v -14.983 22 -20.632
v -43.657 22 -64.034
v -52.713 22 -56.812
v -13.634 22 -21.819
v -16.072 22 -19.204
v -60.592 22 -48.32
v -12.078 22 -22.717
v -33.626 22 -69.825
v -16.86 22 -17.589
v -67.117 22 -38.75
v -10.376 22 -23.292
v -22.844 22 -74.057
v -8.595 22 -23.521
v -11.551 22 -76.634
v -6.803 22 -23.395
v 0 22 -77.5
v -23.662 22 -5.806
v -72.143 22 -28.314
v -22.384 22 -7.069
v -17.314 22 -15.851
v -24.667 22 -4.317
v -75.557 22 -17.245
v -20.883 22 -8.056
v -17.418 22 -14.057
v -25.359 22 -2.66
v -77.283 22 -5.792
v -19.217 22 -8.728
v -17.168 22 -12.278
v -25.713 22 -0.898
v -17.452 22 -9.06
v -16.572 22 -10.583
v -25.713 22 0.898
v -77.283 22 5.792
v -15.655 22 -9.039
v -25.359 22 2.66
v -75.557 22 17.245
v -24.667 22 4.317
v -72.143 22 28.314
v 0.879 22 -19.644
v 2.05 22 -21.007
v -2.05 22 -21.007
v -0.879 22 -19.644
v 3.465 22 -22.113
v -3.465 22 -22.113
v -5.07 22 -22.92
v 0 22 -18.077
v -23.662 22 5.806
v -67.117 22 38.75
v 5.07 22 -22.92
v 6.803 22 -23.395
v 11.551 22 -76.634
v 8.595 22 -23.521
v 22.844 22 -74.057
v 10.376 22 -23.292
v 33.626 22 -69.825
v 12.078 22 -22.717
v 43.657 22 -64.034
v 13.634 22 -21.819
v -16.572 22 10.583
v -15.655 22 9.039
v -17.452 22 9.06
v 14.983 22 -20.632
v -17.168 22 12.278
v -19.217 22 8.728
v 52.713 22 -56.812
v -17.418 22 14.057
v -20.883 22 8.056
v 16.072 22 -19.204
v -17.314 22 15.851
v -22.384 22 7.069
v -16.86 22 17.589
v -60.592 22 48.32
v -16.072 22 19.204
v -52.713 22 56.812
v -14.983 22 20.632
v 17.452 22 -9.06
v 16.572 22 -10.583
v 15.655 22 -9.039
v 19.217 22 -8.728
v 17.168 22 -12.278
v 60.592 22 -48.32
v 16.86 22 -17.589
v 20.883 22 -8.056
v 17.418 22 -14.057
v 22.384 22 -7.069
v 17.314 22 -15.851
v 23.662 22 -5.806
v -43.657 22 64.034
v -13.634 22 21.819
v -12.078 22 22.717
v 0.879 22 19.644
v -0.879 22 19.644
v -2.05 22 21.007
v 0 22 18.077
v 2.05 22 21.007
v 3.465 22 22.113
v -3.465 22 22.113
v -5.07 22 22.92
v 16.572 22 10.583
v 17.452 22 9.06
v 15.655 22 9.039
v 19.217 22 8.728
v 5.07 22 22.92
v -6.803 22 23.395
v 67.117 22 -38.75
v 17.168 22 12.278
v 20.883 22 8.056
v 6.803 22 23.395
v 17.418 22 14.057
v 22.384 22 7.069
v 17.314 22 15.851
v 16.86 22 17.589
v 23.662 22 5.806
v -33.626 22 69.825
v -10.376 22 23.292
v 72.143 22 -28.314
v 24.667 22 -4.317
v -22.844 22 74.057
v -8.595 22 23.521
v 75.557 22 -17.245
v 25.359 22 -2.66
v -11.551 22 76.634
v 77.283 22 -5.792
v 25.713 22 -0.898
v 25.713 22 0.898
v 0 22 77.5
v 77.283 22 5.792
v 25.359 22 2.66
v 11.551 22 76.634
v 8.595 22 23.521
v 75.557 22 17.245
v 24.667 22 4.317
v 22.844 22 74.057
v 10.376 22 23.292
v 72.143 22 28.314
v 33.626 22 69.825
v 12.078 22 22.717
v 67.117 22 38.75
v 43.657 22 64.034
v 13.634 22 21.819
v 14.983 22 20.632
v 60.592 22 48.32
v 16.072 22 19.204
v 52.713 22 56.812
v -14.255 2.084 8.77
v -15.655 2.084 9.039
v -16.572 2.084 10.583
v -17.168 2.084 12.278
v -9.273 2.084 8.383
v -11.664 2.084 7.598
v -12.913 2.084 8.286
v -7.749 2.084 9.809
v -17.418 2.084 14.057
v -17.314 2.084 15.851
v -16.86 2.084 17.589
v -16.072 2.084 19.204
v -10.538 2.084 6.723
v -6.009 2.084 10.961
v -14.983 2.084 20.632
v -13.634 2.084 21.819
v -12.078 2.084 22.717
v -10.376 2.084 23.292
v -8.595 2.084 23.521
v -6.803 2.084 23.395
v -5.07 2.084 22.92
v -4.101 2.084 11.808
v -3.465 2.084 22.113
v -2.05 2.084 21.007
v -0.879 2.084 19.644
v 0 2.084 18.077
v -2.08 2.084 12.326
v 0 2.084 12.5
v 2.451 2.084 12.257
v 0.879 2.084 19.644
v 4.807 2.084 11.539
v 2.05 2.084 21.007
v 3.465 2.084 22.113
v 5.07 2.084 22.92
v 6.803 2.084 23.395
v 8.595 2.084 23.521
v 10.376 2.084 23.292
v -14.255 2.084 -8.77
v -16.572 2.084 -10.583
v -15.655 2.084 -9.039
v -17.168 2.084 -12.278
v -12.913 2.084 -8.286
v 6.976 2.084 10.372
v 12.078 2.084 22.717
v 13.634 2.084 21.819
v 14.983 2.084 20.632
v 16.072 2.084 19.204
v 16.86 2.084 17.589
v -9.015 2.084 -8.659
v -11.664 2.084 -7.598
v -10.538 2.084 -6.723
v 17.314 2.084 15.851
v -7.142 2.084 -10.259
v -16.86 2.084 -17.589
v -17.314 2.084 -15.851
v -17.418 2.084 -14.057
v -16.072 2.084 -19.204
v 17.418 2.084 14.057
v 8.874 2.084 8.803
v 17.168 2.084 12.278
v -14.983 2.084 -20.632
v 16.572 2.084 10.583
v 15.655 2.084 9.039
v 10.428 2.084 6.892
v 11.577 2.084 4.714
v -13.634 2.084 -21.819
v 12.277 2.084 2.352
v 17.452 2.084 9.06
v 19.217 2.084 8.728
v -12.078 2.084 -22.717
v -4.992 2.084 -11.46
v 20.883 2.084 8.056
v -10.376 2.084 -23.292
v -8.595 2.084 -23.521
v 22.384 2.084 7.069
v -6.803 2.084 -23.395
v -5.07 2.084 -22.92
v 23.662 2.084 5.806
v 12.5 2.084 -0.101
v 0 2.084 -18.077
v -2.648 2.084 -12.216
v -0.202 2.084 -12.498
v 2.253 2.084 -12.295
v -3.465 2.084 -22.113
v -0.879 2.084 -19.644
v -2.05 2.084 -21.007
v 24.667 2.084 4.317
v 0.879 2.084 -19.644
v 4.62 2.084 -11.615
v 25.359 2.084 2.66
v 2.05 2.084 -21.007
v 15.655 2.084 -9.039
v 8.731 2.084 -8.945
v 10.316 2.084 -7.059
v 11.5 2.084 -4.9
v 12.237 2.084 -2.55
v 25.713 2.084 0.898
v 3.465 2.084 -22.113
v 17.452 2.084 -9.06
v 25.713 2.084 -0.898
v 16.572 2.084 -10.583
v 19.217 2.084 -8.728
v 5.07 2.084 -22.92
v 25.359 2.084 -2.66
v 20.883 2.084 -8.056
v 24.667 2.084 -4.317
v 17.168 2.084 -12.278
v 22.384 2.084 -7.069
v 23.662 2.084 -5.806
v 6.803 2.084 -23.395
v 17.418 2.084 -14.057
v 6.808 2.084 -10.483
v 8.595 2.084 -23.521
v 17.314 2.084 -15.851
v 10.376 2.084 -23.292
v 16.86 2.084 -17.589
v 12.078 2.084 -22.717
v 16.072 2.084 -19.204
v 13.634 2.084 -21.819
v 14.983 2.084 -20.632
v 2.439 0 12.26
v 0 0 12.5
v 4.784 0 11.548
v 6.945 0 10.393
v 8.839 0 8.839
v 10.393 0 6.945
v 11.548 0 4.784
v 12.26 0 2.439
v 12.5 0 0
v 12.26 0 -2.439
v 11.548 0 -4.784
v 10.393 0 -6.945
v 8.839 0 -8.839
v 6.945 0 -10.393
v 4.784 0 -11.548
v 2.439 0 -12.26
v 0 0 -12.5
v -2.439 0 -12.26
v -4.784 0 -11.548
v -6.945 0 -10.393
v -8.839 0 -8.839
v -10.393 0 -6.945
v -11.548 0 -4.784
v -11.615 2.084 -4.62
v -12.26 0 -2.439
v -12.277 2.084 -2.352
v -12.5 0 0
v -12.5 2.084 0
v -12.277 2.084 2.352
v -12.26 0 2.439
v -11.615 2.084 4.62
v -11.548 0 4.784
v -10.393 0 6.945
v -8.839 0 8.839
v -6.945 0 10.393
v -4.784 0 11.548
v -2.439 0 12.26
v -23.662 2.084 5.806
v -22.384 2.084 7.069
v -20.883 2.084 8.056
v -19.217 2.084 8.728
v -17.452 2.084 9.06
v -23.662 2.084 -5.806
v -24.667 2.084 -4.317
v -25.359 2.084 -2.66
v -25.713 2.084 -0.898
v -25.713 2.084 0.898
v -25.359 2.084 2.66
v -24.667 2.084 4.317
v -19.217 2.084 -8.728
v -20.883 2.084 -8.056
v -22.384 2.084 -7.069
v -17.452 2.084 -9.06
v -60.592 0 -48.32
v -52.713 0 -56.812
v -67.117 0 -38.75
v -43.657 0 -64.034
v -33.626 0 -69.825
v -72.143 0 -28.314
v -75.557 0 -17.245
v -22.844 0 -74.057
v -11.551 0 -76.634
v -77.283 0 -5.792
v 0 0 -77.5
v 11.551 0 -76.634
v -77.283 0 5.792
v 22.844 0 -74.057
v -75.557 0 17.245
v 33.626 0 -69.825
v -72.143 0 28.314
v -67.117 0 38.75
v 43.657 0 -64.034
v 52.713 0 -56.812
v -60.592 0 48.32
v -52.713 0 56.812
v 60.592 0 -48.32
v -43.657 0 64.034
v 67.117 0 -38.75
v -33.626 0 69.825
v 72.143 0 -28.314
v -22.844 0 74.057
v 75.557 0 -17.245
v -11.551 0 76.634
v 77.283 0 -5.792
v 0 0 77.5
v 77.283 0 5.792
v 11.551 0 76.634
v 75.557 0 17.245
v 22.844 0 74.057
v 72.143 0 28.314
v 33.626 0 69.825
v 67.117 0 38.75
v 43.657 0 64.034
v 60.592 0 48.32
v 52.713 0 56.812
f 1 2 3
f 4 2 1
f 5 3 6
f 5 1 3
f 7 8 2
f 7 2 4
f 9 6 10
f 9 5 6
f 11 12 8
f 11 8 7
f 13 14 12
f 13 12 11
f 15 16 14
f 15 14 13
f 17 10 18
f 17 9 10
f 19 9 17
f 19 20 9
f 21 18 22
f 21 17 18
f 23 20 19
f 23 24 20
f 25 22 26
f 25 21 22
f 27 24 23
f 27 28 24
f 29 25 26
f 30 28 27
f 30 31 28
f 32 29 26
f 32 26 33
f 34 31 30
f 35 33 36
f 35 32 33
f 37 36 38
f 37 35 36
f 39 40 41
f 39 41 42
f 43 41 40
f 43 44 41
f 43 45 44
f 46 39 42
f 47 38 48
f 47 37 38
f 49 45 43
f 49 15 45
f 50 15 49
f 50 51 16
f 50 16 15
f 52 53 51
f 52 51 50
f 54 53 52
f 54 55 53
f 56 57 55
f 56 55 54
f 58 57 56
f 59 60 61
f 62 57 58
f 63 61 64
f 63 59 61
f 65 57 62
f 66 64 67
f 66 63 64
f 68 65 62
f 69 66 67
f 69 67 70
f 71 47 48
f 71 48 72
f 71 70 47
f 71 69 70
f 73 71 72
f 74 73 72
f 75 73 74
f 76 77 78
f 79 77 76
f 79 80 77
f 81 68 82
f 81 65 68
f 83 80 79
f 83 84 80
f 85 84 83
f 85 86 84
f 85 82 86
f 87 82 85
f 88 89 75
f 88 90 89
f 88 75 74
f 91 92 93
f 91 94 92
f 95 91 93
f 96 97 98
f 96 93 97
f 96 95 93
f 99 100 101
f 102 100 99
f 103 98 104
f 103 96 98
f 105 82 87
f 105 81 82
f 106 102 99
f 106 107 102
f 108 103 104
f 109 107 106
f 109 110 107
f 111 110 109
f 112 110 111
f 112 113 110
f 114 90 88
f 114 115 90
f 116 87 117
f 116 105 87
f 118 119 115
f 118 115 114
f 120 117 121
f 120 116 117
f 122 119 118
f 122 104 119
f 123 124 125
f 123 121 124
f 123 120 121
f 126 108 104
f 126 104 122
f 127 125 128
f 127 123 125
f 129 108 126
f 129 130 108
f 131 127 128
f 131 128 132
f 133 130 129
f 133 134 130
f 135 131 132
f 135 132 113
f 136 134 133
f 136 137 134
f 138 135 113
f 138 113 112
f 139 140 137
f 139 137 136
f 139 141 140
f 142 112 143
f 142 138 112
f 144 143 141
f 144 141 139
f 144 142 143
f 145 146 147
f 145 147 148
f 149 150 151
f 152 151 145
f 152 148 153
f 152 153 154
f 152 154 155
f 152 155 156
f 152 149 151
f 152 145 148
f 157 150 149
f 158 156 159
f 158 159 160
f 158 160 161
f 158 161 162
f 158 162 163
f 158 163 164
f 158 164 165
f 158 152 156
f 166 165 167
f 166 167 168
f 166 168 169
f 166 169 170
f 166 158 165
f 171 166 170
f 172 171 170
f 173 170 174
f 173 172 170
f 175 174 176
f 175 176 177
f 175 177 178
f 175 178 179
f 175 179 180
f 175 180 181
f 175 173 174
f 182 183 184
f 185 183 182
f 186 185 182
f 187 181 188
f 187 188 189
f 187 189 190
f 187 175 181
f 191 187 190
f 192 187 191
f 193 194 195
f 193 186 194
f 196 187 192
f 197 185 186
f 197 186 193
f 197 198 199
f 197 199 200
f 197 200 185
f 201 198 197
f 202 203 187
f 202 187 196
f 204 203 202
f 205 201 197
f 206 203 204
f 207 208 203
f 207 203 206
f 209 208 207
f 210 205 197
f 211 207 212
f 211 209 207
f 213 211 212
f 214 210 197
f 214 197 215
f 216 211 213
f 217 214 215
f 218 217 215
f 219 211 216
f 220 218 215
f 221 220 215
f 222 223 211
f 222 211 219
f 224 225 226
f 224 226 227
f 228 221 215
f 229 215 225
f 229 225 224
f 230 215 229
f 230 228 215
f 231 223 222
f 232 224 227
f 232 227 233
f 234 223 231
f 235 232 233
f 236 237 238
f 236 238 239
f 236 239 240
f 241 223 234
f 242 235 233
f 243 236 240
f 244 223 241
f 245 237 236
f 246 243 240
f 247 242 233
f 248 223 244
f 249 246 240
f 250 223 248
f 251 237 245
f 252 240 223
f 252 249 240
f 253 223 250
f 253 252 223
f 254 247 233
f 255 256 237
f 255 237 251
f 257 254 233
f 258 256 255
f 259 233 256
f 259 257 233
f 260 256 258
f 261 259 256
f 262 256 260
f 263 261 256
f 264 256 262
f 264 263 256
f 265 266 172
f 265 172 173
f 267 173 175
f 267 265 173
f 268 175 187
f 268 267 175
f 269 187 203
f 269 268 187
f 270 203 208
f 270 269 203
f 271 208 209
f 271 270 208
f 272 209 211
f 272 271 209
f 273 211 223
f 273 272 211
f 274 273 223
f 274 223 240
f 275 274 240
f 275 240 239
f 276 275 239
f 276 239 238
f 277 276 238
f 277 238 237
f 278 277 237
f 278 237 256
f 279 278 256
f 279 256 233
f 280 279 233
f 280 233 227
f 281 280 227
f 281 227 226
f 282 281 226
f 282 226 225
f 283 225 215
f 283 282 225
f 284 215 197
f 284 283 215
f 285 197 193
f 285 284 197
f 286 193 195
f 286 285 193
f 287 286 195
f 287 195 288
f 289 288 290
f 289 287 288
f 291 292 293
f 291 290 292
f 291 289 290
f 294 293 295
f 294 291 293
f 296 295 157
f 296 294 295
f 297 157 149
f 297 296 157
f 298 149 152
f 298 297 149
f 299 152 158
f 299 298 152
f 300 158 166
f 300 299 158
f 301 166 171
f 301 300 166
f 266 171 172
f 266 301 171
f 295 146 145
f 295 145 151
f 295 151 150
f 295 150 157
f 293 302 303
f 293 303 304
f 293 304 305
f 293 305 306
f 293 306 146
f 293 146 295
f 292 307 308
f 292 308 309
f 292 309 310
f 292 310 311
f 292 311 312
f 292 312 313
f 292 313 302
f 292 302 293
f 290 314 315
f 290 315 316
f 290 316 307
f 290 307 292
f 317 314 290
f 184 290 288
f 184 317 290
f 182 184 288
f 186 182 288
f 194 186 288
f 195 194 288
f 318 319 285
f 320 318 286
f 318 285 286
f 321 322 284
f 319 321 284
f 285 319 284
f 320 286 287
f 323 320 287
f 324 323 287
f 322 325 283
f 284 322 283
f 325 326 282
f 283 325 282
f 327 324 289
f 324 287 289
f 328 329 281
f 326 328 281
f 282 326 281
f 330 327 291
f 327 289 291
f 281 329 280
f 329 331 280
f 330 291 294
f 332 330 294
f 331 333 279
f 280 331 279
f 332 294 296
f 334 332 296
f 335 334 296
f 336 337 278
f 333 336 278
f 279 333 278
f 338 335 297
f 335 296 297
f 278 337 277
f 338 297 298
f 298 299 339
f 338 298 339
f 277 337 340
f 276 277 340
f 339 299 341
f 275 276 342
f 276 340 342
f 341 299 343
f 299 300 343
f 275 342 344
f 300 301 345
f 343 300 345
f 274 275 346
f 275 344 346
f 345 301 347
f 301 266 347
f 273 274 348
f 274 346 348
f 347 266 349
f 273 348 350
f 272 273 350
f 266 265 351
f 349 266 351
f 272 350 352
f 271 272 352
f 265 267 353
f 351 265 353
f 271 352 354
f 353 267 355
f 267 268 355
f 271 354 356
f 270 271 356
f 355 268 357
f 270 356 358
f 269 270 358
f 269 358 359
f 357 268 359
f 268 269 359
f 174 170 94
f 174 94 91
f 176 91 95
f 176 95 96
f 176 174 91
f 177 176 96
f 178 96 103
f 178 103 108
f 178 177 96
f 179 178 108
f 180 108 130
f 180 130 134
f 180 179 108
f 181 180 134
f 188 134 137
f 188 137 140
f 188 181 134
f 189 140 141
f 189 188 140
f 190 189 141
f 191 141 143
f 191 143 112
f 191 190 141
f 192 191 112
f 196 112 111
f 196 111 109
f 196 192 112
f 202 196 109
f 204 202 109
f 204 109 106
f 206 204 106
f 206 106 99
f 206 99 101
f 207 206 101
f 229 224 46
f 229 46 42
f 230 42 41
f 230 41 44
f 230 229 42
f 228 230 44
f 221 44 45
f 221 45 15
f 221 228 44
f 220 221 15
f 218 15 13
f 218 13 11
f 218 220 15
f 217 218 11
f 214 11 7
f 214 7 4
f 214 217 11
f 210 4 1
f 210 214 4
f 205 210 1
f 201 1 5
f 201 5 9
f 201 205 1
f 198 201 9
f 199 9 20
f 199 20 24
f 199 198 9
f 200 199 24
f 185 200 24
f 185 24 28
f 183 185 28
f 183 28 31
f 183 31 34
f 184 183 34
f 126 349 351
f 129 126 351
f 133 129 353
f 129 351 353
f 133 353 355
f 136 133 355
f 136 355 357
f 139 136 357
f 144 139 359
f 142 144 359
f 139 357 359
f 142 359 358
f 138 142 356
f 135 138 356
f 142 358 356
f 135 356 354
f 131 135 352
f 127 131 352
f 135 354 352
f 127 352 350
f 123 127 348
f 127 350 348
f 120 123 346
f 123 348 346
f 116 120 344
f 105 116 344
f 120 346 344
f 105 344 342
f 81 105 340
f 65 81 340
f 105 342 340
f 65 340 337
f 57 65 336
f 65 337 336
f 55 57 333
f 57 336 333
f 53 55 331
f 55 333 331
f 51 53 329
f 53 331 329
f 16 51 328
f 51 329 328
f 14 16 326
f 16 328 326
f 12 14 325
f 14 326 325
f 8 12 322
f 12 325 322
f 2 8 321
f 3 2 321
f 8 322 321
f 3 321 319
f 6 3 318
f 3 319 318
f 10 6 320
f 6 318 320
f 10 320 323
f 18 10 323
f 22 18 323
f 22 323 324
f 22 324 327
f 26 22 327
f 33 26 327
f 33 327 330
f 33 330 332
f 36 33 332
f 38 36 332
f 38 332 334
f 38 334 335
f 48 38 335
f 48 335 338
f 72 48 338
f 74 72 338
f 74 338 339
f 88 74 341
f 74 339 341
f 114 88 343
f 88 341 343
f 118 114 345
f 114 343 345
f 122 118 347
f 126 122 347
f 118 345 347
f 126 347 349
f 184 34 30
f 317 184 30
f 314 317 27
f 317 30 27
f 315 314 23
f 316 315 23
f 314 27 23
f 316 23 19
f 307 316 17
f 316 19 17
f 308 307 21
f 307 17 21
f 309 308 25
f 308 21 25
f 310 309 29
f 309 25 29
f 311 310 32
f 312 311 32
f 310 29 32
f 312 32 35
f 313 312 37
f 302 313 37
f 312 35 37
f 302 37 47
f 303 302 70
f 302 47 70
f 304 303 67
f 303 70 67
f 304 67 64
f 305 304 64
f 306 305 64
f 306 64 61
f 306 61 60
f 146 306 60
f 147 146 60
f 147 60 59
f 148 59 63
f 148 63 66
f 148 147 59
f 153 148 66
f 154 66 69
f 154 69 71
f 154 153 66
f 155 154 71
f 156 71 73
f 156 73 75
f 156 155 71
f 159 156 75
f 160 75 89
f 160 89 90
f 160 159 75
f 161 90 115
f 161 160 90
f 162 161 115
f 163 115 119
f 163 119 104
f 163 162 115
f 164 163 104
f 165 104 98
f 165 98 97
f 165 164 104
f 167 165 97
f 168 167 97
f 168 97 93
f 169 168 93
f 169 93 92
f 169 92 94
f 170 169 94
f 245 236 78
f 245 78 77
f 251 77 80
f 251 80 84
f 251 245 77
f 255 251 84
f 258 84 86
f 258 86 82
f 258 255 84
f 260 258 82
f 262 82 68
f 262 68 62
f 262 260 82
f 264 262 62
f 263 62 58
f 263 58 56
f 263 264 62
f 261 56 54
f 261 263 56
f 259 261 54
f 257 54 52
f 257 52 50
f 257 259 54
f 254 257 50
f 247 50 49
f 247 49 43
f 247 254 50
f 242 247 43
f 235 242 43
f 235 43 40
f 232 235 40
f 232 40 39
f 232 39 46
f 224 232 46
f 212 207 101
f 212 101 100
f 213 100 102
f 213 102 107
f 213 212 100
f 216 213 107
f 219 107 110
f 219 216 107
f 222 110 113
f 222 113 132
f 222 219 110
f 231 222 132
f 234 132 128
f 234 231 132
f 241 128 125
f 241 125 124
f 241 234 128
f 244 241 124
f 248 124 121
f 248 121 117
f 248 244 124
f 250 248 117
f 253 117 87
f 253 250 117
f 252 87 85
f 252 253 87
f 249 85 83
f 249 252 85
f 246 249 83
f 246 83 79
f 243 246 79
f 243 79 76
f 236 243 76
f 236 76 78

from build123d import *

# Parameters (mm, degrees)
SKETCH1_R           = 77.5
BOSS_EXTRUDE1_DEPTH = 22
SKETCH2_R           = 12.5
CUT_EXTRUDE1_DEPTH  = 112.787745303
SKETCH3_R           = 9.094540672
CUT_EXTRUDE2_DEPTH  = 19.91553476
CIRPATTERN1_COUNT   = 6


with BuildPart() as part:
    # Sketch1 → Boss-Extrude1 (new body)
    with BuildSketch(Plane(origin=(0, 0, 0), x_dir=(1, 0, 0), z_dir=(0, 1, 0))):
        Circle(SKETCH1_R)
    extrude(amount=BOSS_EXTRUDE1_DEPTH)

    # Sketch2 → Cut-Extrude1 (cut, through all)
    with BuildSketch(Plane(origin=(0, 0, 0), x_dir=(1, 0, 0), z_dir=(0, 1, 0))):
        Circle(SKETCH2_R)
    extrude(amount=CUT_EXTRUDE1_DEPTH, mode=Mode.SUBTRACT)

    # Sketch3 → Cut-Extrude2 (cut)
    with BuildSketch(Plane(origin=(0, 22, 0), x_dir=(1, 0, 0), z_dir=(0, 1, 0))):
        with Locations((-16.662496282, 0)):
            Circle(SKETCH3_R)
    cut_extrude2 = extrude(amount=-CUT_EXTRUDE2_DEPTH, mode=Mode.SUBTRACT)

    # CirPattern1: Cut-Extrude2 ×6 about axis
    cirpattern1_axis = Axis((0, 0, 0), (0, 1, 0))
    for i in range(1, CIRPATTERN1_COUNT):
        add(cut_extrude2.rotate(cirpattern1_axis, i * 360 / CIRPATTERN1_COUNT), mode=Mode.SUBTRACT)


solid = part.part
